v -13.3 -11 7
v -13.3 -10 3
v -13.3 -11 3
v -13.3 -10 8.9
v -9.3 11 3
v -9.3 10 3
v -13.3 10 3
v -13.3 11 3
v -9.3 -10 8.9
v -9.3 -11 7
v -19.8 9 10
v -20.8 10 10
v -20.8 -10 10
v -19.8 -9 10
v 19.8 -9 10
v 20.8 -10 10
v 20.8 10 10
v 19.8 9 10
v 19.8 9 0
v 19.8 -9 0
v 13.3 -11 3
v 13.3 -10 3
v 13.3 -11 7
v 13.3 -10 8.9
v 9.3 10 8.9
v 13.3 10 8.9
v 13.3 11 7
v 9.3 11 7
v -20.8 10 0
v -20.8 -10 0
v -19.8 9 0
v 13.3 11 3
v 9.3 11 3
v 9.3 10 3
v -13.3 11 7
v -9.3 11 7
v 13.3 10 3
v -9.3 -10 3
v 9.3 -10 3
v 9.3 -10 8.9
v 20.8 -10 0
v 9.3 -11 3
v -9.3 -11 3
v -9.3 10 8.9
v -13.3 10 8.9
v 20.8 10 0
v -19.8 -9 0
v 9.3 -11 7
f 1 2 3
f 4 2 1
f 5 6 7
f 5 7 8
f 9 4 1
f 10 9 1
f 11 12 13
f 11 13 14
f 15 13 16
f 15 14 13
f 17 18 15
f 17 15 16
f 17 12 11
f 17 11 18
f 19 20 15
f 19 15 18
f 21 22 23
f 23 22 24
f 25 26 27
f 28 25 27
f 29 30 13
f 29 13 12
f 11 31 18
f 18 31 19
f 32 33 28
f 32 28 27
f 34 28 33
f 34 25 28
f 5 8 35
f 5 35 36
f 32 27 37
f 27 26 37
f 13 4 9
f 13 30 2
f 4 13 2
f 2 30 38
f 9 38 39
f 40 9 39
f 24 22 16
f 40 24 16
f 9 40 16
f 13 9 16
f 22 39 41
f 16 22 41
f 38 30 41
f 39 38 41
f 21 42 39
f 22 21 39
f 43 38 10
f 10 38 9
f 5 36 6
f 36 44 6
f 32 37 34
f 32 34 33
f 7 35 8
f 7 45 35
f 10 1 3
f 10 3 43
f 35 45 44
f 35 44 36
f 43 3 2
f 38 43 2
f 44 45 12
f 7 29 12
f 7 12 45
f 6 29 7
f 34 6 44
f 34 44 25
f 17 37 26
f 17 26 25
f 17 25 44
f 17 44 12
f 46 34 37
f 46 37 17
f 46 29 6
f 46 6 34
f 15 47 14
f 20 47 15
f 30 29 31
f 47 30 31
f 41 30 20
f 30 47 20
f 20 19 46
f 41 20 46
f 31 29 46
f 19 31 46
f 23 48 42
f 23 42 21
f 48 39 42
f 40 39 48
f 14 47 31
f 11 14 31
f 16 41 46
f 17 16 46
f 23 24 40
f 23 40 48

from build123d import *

# Parameters (mm, degrees)
SKETCH1_W           = 41.6
SKETCH1_H           = 20
SKETCH1_W_2         = 39.6
SKETCH1_H_2         = 18
BOSS_EXTRUDE2_DEPTH = 10
SKETCH2_W           = 4
SKETCH2_H           = 10
BOSS_EXTRUDE3_DEPTH = 1
SKETCH3_W           = 3
SKETCH3_H           = 1
CUT_EXTRUDE1_DEPTH  = 27
SKETCH4_W           = 4
SKETCH4_H           = 10
BOSS_EXTRUDE4_DEPTH = 1
SKETCH5_W           = 3
SKETCH5_H           = 1
CUT_EXTRUDE2_DEPTH  = 27


with BuildPart() as part:
    # Sketch1 → Boss-Extrude2 (new body)
    with BuildSketch(Plane.XY):
        Rectangle(SKETCH1_W, SKETCH1_H)
        Rectangle(SKETCH1_W_2, SKETCH1_H_2, mode=Mode.SUBTRACT)
    extrude(amount=BOSS_EXTRUDE2_DEPTH)

    # Sketch2 → Boss-Extrude3 (add)
    with BuildSketch(Plane.XZ.offset(10)):
        with Locations((-11.3, 5)):
            Rectangle(SKETCH2_W, SKETCH2_H)
        with Locations((11.3, 5)):
            Rectangle(SKETCH2_W, SKETCH2_H)
    extrude(amount=BOSS_EXTRUDE3_DEPTH)

    # Sketch3 → Cut-Extrude1 (cut)
    with BuildSketch(Plane.ZY.offset(13.3)):
        Polygon((8.900149248, -10), (7, -11), (10, -11), (10, -10), align=None)
        with Locations((1.5, -10.5)):
            Rectangle(SKETCH3_W, SKETCH3_H)
    extrude(amount=-CUT_EXTRUDE1_DEPTH, mode=Mode.SUBTRACT)

    # Sketch4 → Boss-Extrude4 (add)
    with BuildSketch(Plane(origin=(0, 10, 0), x_dir=(1, 0, 0), z_dir=(0, 1, 0))):
        with Locations((11.3, -5)):
            Rectangle(SKETCH4_W, SKETCH4_H)
        with Locations((-11.3, -5)):
            Rectangle(SKETCH4_W, SKETCH4_H)
    extrude(amount=BOSS_EXTRUDE4_DEPTH)

    # Sketch5 → Cut-Extrude2 (cut)
    with BuildSketch(Plane(origin=(13.3, 0, 0), x_dir=(0, 0, -1), z_dir=(1, 0, 0))):
        Polygon((-7, 11), (-10, 11), (-10, 10), (-8.900149248, 10), align=None)
        with Locations((-1.5, 10.5)):
            Rectangle(SKETCH5_W, SKETCH5_H)
    extrude(amount=-CUT_EXTRUDE2_DEPTH, mode=Mode.SUBTRACT)


solid = part.part
